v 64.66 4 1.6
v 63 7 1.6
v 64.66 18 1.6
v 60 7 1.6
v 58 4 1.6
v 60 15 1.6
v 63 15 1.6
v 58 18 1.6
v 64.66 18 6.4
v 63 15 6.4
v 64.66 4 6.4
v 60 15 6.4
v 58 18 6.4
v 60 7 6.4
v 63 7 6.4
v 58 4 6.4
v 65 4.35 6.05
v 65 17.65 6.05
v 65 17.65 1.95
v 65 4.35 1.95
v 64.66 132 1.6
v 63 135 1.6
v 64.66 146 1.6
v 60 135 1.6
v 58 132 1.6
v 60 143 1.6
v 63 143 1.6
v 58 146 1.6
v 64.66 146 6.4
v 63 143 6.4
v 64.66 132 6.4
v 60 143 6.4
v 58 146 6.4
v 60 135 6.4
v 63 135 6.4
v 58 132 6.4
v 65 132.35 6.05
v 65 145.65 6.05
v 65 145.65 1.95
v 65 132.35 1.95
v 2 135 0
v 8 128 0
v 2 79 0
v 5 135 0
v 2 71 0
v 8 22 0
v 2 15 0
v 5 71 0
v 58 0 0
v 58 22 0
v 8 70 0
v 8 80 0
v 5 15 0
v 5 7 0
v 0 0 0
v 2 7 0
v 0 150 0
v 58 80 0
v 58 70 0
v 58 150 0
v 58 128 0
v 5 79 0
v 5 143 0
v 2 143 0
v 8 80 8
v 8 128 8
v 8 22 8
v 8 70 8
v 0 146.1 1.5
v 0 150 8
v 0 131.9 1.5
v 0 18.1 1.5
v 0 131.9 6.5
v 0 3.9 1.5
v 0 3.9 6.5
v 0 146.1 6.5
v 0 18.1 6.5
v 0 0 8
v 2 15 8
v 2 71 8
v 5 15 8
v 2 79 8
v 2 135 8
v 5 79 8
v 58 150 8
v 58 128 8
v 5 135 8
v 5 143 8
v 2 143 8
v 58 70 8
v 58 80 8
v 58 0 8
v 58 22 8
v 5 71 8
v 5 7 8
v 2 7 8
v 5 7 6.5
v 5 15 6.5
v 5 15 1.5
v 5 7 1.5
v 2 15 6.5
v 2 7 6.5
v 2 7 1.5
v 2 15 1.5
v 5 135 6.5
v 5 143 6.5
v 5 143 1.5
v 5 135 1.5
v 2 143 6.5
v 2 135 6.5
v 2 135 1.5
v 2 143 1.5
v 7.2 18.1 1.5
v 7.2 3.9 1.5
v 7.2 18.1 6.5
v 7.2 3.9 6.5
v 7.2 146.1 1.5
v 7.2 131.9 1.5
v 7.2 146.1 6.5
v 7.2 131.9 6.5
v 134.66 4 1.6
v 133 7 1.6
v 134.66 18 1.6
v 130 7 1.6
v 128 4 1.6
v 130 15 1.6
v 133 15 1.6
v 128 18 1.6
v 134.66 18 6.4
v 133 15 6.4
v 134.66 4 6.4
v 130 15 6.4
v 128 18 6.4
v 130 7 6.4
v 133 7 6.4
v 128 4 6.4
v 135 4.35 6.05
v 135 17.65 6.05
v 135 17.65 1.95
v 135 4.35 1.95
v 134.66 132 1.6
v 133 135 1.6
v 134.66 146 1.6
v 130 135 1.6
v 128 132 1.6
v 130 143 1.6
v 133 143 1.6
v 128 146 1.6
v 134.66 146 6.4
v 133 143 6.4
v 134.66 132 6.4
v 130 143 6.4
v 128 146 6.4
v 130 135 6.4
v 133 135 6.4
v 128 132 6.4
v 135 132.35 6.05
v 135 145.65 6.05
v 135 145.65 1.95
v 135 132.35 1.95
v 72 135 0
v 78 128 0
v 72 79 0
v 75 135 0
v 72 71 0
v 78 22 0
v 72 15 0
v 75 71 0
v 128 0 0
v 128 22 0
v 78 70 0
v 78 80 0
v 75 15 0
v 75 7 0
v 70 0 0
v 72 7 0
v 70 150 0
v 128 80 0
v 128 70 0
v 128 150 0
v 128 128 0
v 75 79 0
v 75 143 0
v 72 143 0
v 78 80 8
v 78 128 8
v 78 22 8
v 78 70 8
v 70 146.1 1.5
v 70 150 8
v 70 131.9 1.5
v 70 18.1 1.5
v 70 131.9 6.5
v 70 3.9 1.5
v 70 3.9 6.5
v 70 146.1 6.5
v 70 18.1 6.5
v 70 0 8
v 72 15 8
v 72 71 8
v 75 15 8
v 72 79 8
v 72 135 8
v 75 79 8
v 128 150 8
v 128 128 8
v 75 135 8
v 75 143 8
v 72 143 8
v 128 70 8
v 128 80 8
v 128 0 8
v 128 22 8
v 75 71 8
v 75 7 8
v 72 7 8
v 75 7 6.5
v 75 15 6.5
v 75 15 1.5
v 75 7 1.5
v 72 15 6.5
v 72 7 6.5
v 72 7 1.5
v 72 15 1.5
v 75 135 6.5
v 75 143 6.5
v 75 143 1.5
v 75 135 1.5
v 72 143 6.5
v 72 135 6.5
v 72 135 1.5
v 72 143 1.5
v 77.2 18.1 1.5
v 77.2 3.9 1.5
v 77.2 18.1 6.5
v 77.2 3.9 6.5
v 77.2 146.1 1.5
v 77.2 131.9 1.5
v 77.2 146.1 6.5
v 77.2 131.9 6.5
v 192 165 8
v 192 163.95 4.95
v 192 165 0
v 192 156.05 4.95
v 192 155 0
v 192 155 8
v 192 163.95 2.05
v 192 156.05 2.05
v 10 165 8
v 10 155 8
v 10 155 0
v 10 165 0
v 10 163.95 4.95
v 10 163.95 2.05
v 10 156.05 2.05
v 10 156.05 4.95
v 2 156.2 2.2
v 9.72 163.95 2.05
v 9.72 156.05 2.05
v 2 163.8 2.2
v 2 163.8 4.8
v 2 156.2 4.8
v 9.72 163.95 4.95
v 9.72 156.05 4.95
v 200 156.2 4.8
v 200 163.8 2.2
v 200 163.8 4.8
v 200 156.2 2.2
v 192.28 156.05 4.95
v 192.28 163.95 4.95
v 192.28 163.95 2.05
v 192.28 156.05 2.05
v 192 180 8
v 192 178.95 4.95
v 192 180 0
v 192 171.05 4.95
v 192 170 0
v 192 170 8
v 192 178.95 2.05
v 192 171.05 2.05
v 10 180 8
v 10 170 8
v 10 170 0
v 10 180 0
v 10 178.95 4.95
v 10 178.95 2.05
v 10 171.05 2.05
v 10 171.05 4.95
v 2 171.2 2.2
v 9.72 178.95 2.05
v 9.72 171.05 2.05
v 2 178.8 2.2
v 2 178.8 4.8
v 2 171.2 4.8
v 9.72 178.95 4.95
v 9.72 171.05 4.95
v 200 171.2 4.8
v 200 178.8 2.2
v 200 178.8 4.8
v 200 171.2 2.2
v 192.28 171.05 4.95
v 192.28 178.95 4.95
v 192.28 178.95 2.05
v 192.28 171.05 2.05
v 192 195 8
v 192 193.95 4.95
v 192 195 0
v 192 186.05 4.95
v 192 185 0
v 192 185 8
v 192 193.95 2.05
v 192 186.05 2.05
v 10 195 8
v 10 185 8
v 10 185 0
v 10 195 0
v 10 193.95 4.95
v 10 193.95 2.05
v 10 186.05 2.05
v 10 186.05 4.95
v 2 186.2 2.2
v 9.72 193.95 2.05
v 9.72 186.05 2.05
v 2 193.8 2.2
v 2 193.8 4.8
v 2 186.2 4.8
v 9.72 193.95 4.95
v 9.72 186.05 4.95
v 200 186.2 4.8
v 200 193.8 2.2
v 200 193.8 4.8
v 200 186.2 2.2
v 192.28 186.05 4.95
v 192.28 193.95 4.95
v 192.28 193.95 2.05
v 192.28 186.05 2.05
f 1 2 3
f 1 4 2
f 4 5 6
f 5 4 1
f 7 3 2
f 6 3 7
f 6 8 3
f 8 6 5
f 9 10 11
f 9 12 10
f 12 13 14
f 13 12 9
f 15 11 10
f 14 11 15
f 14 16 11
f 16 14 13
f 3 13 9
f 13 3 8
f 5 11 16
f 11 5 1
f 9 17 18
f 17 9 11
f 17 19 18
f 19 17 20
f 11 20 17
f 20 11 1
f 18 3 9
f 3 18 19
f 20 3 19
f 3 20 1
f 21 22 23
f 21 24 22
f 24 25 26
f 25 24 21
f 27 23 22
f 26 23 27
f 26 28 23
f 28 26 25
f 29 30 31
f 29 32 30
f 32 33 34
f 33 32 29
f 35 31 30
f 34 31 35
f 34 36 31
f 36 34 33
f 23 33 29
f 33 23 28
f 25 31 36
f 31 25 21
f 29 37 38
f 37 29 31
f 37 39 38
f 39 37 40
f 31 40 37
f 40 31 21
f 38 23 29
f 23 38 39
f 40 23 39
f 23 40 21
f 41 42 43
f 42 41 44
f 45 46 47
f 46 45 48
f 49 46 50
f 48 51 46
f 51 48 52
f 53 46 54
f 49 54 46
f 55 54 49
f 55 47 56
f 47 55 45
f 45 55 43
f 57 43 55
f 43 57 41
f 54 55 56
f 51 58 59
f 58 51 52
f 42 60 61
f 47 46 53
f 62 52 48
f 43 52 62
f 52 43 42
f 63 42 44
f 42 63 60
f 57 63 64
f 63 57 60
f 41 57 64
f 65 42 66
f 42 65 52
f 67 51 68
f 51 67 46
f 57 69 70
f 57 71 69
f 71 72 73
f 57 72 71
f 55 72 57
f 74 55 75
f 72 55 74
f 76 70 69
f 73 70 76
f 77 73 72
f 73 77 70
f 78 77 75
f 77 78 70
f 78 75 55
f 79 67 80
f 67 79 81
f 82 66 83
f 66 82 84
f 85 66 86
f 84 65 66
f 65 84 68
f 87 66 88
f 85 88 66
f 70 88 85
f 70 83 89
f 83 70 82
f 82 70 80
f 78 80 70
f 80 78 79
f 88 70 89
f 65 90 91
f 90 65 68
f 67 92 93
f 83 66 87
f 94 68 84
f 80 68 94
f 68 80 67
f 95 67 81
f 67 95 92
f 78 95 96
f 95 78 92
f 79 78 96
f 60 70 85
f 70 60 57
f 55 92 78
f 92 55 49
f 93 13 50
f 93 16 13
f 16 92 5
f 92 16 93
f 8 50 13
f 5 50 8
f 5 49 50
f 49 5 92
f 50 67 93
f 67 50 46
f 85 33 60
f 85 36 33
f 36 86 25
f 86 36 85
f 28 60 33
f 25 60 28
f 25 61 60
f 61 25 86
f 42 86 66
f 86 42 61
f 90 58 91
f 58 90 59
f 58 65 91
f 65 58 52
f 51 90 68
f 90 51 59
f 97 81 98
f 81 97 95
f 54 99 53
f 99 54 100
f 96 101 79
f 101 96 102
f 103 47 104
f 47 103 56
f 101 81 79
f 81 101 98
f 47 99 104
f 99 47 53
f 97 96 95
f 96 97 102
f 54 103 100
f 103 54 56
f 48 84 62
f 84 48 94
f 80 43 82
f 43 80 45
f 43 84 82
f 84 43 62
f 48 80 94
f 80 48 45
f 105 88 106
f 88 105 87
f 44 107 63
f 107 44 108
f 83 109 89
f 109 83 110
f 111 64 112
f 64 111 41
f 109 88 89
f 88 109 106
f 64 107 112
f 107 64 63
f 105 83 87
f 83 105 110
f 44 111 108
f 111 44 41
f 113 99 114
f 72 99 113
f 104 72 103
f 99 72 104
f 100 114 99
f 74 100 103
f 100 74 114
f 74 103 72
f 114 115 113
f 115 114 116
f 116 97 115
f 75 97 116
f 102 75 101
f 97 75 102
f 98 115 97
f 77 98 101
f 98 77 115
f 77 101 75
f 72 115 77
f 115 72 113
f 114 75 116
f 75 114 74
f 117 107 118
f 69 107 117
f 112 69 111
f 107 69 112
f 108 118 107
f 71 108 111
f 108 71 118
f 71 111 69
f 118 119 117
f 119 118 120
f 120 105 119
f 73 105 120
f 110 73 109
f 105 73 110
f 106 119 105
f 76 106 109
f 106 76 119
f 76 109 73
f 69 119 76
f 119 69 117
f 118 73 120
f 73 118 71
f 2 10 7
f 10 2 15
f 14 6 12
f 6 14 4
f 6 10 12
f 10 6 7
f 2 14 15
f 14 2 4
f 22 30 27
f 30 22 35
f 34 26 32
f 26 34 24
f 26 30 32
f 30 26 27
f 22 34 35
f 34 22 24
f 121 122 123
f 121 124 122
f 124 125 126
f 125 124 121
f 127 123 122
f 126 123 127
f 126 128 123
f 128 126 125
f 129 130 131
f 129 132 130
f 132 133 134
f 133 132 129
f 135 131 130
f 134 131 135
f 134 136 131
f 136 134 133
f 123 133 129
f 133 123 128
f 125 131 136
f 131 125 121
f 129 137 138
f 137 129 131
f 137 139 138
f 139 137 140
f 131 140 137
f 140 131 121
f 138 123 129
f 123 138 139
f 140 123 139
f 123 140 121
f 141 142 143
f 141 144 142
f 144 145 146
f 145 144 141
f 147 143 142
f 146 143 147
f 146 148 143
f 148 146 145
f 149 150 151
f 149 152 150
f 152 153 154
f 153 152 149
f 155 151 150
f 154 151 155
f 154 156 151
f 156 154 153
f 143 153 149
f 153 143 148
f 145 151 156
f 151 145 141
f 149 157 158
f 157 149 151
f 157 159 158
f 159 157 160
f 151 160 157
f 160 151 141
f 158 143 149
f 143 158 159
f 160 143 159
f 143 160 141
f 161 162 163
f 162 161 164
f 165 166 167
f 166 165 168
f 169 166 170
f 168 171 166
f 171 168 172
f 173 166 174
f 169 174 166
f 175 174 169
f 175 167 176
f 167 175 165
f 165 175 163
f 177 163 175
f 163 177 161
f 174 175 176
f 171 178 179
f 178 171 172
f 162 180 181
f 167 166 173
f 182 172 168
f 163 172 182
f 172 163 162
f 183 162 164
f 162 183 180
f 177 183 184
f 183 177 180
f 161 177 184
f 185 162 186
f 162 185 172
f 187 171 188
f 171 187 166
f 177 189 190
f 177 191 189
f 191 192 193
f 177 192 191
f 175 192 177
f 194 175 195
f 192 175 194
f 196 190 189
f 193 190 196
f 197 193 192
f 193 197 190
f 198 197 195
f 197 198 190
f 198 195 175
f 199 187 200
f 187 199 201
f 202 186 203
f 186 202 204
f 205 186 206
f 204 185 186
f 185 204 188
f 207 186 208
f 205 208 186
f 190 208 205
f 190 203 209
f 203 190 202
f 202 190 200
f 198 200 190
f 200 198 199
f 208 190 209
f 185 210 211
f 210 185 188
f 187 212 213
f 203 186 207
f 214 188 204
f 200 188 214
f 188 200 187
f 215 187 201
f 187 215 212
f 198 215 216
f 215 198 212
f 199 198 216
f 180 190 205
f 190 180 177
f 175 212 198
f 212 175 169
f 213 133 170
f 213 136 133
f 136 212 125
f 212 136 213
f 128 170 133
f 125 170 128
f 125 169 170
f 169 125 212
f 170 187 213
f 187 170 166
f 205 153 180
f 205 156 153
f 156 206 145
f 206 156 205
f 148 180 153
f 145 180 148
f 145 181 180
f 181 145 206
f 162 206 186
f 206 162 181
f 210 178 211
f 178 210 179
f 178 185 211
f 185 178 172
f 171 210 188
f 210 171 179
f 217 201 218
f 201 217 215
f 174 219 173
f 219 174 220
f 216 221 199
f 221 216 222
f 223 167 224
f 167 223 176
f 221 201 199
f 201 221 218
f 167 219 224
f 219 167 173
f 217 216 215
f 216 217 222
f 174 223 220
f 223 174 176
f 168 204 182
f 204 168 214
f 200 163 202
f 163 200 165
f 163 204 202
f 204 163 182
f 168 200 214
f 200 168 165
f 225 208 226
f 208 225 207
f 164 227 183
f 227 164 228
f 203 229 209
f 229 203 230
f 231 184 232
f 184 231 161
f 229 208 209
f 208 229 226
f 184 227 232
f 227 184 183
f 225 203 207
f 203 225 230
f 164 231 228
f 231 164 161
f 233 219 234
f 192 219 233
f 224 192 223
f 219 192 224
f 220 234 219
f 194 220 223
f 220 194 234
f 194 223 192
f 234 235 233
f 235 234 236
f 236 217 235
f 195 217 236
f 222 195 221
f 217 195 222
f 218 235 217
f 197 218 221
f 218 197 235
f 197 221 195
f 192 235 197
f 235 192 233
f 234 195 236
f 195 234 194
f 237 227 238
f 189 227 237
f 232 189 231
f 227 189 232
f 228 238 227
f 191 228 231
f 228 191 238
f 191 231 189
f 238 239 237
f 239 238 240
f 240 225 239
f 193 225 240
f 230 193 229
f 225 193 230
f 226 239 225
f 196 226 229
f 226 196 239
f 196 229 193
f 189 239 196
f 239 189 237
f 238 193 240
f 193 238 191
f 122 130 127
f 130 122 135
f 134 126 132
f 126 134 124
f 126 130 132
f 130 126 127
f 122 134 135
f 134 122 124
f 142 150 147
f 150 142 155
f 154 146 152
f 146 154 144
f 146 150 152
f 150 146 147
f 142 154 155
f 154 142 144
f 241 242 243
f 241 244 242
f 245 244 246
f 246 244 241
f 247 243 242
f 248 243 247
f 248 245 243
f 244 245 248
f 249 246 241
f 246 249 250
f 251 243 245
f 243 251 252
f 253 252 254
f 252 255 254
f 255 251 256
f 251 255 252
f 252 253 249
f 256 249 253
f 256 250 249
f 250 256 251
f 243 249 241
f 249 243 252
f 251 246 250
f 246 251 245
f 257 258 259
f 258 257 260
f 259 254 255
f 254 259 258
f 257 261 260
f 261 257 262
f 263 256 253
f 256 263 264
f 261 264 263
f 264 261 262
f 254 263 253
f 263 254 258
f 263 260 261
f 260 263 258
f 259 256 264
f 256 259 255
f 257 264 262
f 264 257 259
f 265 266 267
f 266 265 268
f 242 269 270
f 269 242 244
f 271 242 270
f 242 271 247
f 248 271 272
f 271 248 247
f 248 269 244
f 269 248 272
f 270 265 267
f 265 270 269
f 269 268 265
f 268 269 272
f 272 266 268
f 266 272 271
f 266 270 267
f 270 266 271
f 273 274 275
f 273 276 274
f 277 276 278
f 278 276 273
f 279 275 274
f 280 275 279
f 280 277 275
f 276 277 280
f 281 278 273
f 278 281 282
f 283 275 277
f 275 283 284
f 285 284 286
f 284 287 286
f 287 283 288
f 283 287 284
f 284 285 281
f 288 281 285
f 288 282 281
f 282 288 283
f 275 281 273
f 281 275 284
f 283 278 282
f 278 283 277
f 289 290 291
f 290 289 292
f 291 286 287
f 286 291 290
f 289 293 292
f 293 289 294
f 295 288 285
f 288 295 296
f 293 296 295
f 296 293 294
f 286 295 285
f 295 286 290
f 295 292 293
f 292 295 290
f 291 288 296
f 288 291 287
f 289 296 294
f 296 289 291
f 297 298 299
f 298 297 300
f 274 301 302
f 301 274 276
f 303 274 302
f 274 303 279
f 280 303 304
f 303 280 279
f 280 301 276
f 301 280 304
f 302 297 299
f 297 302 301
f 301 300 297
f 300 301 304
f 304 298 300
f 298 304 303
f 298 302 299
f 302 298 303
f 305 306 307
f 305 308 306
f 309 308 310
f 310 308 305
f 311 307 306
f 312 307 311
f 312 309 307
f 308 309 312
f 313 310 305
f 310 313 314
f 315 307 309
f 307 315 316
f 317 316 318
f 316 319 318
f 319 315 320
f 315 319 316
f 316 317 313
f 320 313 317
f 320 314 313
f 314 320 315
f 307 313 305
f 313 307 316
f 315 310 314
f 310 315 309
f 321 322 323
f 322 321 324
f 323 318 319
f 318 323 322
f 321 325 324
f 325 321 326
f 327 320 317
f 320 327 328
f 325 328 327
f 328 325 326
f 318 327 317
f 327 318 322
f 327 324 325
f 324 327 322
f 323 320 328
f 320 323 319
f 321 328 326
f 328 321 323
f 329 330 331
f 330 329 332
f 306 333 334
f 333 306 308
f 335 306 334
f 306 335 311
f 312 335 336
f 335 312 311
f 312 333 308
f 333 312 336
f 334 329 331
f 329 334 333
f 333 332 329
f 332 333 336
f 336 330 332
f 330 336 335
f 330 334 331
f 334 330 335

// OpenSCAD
// Flat-pack repeatable rack tier R3.5 — units: mm.
// Target: PETG, 0.4 mm nozzle; actual normal layer height varied by part.
//
// Corrected architecture:
// - Two identical side frames and three identical crossbeams.
// - Every crossbeam has an integral C-spec peg at each end.
// - The front and rear beam pegs also pass through the locating tongues of the
//   tier below, so those four integral pegs lock all four stacking corners.
// - The middle beam supports the drawer and aligns with a slim full-height
//   center guide on each side frame to reduce lateral drawer drift.
// - No loose pins, clips, screws, or extra bottom lock passages.
//
// One print plate contains exactly five parts:
//   2 x identical side frames
//   3 x identical crossbeams with integral C-spec pegs
//
// The C fit comes from joint_lock_fit_test_v2_abc.scad. The tongue/socket fit
// comes from captive_joint_fit_test_v3.scad.

$fn = 40;
part = "print_plate";

// Rack and nominal drawer envelope.
rack_d = 150;
inner_w = 182;               // 180 mm drawer + 1 mm per side.
frame_t = 8;
outer_w = inner_w+2*frame_t;
tier_pitch = 58;

drawer_w = 180;
drawer_d = 140;
drawer_h = 48;
drawer_x = 1;
drawer_y = 0;
drawer_z = 8;

// Two-post side frame and three bottom crossbeams.
rail_h = 8;
post_d = 22;
beam_y = 10;
beam_z = 8;
front_joint_y = post_d/2;             // 11 mm.
middle_beam_y = rack_d/2;             // 75 mm.
rear_joint_y = rack_d-post_d/2;       // 139 mm.
beam_centers = [front_joint_y,middle_beam_y,rear_joint_y];
center_guide_d = 10;          // Slim Y-width; adds guidance without a bulky post.

// One shared transverse centerline lets the front/rear beam pegs double as
// the tier-to-tier locks.
joint_center_z = 3.5;

// Nominal C-spec peg/receiver dimensions.
female_slot_y = 8.0;
female_slot_z = 3.0;
male_root_y = 7.9;
male_root_z = 2.9;
male_tip_reduction = 0.30;
male_len = frame_t;

// Nominal repeatable tongue/socket geometry.
stack_tongue_x = 4.8;
stack_tongue_y = 14.0;
stack_tongue_h = 7.0;
stack_chamfer = 0.35;
stack_clearance = 0.10;      // Per side, selected by the physical test.
stack_socket_extra_depth = 0.20;

module stack_tongue(y_center) {
    tx = (frame_t-stack_tongue_x)/2;
    ty = y_center-stack_tongue_y/2;

    union() {
        translate([tx,ty,tier_pitch-0.10])
            cube([stack_tongue_x,stack_tongue_y,
                  stack_tongue_h-stack_chamfer+0.10]);

        hull() {
            translate([tx,ty,
                       tier_pitch+stack_tongue_h-stack_chamfer-0.01])
                cube([stack_tongue_x,stack_tongue_y,0.02]);
            translate([tx+stack_chamfer,
                       ty+stack_chamfer,
                       tier_pitch+stack_tongue_h-0.02])
                cube([stack_tongue_x-2*stack_chamfer,
                      stack_tongue_y-2*stack_chamfer,0.02]);
        }
    }
}

module stack_socket(y_center) {
    sx = stack_tongue_x+2*stack_clearance;
    sy = stack_tongue_y+2*stack_clearance;
    socket_depth = stack_tongue_h+stack_socket_extra_depth;

    translate([(frame_t-sx)/2,
               y_center-sy/2,
               -0.05])
        cube([sx,sy,socket_depth+0.05]);
}

// All three bottom receivers use the same C slot. At the front and rear this
// one opening is also the layer-lock passage; no second hole is added.
module beam_female_slot(y_center,z_center=joint_center_z) {
    translate([-0.05,
               y_center-female_slot_y/2,
               z_center-female_slot_z/2])
        cube([frame_t+0.10,female_slot_y,female_slot_z]);
}

// Matching passage through the top locating tongue. The next tier's
// front/rear integral beam peg passes through this opening.
module tongue_lock_passage(y_center) {
    translate([-0.05,
               y_center-female_slot_y/2,
               tier_pitch+joint_center_z-female_slot_z/2])
        cube([frame_t+0.10,female_slot_y,female_slot_z]);
}

module side_frame() {
    difference() {
        union() {
            // Continuous lower rail includes the complete bottom support.
            cube([frame_t,rack_d,rail_h]);

            // Two equal corner posts plus one slim central drawer guide.
            cube([frame_t,post_d,tier_pitch]);
            translate([0,rack_d-post_d,0])
                cube([frame_t,post_d,tier_pitch]);
            translate([0,middle_beam_y-center_guide_d/2,0])
                cube([frame_t,center_guide_d,tier_pitch]);

            stack_tongue(front_joint_y);
            stack_tongue(rear_joint_y);
        }

        // Exactly three receiver openings along the bottom rail.
        for (yc=beam_centers)
            beam_female_slot(yc);

        // Two bottom sockets receive the tier below.
        stack_socket(front_joint_y);
        stack_socket(rear_joint_y);

        // Two top-tongue passages are used by the next tier's front/rear
        // beams. They are not an additional bottom-hole system.
        tongue_lock_passage(front_joint_y);
        tongue_lock_passage(rear_joint_y);
    }
}

// Positive-X integral C peg. Its centerline is shared with the tongue hole.
module c_male_peg_positive() {
    tip_y = male_root_y-male_tip_reduction;
    tip_z = male_root_z-male_tip_reduction;

    hull() {
        translate([-0.02,-male_root_y/2,
                   joint_center_z-male_root_z/2])
            cube([0.30,male_root_y,male_root_z]);
        translate([male_len-0.30,-tip_y/2,
                   joint_center_z-tip_z/2])
            cube([0.30,tip_y,tip_z]);
    }
}

module crossbeam() {
    union() {
        translate([0,-beam_y/2,0])
            cube([inner_w,beam_y,beam_z]);

        mirror([1,0,0]) c_male_peg_positive();
        translate([inner_w,0,0]) c_male_peg_positive();
    }
}

module assembled_side_frames(z0=0) {
    translate([0,0,z0]) {
        mirror([1,0,0]) side_frame();
        translate([inner_w,0,0]) side_frame();
    }
}

module assembled_beams(z0=0) {
    translate([0,0,z0])
        for (yc=beam_centers)
            translate([0,yc,0]) crossbeam();
}

module assembled_tier(z0=0) {
    assembled_side_frames(z0);
    assembled_beams(z0);
}

module assembled_frame() {
    assembled_tier(0);
}

module two_tier_stack() {
    assembled_tier(0);
    assembled_tier(tier_pitch);
}

module drawer_body() {
    import("../../stl/current/single_drawer_body_v1_4.stl");
}

module assembled_with_drawer() {
    color([0.34,0.38,0.41]) assembled_frame();
    color([0.78,0.38,0.12,0.82])
        translate([drawer_x,drawer_y,drawer_z]) drawer_body();
}

// Exact two-tier preview: front/rear beams of the upper tier are highlighted
// because their four integral ends are the only layer locks.
module two_tier_preview() {
    color([0.34,0.38,0.41]) {
        assembled_side_frames(0);
        assembled_beams(0);
        assembled_side_frames(tier_pitch);
        translate([0,middle_beam_y,tier_pitch]) crossbeam();
    }

    color([0.82,0.22,0.14]) {
        translate([0,front_joint_y,tier_pitch]) crossbeam();
        translate([0,rear_joint_y,tier_pitch]) crossbeam();
    }

    color([0.82,0.43,0.13,0.42]) {
        translate([drawer_x,drawer_y,drawer_z]) drawer_body();
        translate([drawer_x,drawer_y,tier_pitch+drawer_z]) drawer_body();
    }
}

module side_frame_print(x0) {
    // Broad Y-Z face on the bed; printed height is only 8 mm.
    translate([x0,0,frame_t])
        rotate([0,90,0]) side_frame();
}

module print_plate() {
    side_frame_print(0);
    side_frame_print(70);

    // All three beams are identical. Their end pegs are already fused in.
    for (y0=[160,175,190])
        translate([10,y0,0]) crossbeam();
}

module detail_lower_corner() {
    intersection() {
        mirror([1,0,0]) side_frame();
        translate([-frame_t-0.1,0,tier_pitch-10])
            cube([frame_t+0.2,post_d+2,stack_tongue_h+11]);
    }
}

module detail_upper_corner() {
    translate([0,0,tier_pitch])
        intersection() {
            mirror([1,0,0]) side_frame();
            translate([-frame_t-0.1,0,0])
                cube([frame_t+0.2,post_d+2,12]);
        }
}

module detail_lock_beam() {
    intersection() {
        translate([0,front_joint_y,tier_pitch]) crossbeam();
        translate([-frame_t-0.1,0,tier_pitch-0.1])
            cube([frame_t+34,post_d+2,beam_z+0.2]);
    }
}

// Left/front seam detail. The upper tier beam end passes through the upper
// side-frame receiver and the lower locating tongue at the same time.
module front_left_lock_detail() {
    detail_lower_corner();
    detail_upper_corner();
    detail_lock_beam();
}

// Collision checks return only zero-thickness contact surfaces when correct.
module fit_check_stack() {
    intersection() {
        assembled_tier(0);
        assembled_tier(tier_pitch);
    }
}

module fit_check_drawer() {
    intersection() {
        assembled_frame();
        translate([drawer_x,drawer_y,drawer_z+0.01]) drawer_body();
    }
}

if(part=="print_plate") print_plate();
else if(part=="side_frame") side_frame();
else if(part=="crossbeam") crossbeam();
else if(part=="assembled_frame") assembled_frame();
else if(part=="assembled_with_drawer") assembled_with_drawer();
else if(part=="two_tier_stack") two_tier_stack();
else if(part=="two_tier_preview") two_tier_preview();
else if(part=="front_left_lock_detail") front_left_lock_detail();
else if(part=="detail_lower_corner") detail_lower_corner();
else if(part=="detail_upper_corner") detail_upper_corner();
else if(part=="detail_lock_beam") detail_lock_beam();
else if(part=="fit_check_stack") fit_check_stack();
else if(part=="fit_check_drawer") fit_check_drawer();
else assert(false,"Unknown part");
